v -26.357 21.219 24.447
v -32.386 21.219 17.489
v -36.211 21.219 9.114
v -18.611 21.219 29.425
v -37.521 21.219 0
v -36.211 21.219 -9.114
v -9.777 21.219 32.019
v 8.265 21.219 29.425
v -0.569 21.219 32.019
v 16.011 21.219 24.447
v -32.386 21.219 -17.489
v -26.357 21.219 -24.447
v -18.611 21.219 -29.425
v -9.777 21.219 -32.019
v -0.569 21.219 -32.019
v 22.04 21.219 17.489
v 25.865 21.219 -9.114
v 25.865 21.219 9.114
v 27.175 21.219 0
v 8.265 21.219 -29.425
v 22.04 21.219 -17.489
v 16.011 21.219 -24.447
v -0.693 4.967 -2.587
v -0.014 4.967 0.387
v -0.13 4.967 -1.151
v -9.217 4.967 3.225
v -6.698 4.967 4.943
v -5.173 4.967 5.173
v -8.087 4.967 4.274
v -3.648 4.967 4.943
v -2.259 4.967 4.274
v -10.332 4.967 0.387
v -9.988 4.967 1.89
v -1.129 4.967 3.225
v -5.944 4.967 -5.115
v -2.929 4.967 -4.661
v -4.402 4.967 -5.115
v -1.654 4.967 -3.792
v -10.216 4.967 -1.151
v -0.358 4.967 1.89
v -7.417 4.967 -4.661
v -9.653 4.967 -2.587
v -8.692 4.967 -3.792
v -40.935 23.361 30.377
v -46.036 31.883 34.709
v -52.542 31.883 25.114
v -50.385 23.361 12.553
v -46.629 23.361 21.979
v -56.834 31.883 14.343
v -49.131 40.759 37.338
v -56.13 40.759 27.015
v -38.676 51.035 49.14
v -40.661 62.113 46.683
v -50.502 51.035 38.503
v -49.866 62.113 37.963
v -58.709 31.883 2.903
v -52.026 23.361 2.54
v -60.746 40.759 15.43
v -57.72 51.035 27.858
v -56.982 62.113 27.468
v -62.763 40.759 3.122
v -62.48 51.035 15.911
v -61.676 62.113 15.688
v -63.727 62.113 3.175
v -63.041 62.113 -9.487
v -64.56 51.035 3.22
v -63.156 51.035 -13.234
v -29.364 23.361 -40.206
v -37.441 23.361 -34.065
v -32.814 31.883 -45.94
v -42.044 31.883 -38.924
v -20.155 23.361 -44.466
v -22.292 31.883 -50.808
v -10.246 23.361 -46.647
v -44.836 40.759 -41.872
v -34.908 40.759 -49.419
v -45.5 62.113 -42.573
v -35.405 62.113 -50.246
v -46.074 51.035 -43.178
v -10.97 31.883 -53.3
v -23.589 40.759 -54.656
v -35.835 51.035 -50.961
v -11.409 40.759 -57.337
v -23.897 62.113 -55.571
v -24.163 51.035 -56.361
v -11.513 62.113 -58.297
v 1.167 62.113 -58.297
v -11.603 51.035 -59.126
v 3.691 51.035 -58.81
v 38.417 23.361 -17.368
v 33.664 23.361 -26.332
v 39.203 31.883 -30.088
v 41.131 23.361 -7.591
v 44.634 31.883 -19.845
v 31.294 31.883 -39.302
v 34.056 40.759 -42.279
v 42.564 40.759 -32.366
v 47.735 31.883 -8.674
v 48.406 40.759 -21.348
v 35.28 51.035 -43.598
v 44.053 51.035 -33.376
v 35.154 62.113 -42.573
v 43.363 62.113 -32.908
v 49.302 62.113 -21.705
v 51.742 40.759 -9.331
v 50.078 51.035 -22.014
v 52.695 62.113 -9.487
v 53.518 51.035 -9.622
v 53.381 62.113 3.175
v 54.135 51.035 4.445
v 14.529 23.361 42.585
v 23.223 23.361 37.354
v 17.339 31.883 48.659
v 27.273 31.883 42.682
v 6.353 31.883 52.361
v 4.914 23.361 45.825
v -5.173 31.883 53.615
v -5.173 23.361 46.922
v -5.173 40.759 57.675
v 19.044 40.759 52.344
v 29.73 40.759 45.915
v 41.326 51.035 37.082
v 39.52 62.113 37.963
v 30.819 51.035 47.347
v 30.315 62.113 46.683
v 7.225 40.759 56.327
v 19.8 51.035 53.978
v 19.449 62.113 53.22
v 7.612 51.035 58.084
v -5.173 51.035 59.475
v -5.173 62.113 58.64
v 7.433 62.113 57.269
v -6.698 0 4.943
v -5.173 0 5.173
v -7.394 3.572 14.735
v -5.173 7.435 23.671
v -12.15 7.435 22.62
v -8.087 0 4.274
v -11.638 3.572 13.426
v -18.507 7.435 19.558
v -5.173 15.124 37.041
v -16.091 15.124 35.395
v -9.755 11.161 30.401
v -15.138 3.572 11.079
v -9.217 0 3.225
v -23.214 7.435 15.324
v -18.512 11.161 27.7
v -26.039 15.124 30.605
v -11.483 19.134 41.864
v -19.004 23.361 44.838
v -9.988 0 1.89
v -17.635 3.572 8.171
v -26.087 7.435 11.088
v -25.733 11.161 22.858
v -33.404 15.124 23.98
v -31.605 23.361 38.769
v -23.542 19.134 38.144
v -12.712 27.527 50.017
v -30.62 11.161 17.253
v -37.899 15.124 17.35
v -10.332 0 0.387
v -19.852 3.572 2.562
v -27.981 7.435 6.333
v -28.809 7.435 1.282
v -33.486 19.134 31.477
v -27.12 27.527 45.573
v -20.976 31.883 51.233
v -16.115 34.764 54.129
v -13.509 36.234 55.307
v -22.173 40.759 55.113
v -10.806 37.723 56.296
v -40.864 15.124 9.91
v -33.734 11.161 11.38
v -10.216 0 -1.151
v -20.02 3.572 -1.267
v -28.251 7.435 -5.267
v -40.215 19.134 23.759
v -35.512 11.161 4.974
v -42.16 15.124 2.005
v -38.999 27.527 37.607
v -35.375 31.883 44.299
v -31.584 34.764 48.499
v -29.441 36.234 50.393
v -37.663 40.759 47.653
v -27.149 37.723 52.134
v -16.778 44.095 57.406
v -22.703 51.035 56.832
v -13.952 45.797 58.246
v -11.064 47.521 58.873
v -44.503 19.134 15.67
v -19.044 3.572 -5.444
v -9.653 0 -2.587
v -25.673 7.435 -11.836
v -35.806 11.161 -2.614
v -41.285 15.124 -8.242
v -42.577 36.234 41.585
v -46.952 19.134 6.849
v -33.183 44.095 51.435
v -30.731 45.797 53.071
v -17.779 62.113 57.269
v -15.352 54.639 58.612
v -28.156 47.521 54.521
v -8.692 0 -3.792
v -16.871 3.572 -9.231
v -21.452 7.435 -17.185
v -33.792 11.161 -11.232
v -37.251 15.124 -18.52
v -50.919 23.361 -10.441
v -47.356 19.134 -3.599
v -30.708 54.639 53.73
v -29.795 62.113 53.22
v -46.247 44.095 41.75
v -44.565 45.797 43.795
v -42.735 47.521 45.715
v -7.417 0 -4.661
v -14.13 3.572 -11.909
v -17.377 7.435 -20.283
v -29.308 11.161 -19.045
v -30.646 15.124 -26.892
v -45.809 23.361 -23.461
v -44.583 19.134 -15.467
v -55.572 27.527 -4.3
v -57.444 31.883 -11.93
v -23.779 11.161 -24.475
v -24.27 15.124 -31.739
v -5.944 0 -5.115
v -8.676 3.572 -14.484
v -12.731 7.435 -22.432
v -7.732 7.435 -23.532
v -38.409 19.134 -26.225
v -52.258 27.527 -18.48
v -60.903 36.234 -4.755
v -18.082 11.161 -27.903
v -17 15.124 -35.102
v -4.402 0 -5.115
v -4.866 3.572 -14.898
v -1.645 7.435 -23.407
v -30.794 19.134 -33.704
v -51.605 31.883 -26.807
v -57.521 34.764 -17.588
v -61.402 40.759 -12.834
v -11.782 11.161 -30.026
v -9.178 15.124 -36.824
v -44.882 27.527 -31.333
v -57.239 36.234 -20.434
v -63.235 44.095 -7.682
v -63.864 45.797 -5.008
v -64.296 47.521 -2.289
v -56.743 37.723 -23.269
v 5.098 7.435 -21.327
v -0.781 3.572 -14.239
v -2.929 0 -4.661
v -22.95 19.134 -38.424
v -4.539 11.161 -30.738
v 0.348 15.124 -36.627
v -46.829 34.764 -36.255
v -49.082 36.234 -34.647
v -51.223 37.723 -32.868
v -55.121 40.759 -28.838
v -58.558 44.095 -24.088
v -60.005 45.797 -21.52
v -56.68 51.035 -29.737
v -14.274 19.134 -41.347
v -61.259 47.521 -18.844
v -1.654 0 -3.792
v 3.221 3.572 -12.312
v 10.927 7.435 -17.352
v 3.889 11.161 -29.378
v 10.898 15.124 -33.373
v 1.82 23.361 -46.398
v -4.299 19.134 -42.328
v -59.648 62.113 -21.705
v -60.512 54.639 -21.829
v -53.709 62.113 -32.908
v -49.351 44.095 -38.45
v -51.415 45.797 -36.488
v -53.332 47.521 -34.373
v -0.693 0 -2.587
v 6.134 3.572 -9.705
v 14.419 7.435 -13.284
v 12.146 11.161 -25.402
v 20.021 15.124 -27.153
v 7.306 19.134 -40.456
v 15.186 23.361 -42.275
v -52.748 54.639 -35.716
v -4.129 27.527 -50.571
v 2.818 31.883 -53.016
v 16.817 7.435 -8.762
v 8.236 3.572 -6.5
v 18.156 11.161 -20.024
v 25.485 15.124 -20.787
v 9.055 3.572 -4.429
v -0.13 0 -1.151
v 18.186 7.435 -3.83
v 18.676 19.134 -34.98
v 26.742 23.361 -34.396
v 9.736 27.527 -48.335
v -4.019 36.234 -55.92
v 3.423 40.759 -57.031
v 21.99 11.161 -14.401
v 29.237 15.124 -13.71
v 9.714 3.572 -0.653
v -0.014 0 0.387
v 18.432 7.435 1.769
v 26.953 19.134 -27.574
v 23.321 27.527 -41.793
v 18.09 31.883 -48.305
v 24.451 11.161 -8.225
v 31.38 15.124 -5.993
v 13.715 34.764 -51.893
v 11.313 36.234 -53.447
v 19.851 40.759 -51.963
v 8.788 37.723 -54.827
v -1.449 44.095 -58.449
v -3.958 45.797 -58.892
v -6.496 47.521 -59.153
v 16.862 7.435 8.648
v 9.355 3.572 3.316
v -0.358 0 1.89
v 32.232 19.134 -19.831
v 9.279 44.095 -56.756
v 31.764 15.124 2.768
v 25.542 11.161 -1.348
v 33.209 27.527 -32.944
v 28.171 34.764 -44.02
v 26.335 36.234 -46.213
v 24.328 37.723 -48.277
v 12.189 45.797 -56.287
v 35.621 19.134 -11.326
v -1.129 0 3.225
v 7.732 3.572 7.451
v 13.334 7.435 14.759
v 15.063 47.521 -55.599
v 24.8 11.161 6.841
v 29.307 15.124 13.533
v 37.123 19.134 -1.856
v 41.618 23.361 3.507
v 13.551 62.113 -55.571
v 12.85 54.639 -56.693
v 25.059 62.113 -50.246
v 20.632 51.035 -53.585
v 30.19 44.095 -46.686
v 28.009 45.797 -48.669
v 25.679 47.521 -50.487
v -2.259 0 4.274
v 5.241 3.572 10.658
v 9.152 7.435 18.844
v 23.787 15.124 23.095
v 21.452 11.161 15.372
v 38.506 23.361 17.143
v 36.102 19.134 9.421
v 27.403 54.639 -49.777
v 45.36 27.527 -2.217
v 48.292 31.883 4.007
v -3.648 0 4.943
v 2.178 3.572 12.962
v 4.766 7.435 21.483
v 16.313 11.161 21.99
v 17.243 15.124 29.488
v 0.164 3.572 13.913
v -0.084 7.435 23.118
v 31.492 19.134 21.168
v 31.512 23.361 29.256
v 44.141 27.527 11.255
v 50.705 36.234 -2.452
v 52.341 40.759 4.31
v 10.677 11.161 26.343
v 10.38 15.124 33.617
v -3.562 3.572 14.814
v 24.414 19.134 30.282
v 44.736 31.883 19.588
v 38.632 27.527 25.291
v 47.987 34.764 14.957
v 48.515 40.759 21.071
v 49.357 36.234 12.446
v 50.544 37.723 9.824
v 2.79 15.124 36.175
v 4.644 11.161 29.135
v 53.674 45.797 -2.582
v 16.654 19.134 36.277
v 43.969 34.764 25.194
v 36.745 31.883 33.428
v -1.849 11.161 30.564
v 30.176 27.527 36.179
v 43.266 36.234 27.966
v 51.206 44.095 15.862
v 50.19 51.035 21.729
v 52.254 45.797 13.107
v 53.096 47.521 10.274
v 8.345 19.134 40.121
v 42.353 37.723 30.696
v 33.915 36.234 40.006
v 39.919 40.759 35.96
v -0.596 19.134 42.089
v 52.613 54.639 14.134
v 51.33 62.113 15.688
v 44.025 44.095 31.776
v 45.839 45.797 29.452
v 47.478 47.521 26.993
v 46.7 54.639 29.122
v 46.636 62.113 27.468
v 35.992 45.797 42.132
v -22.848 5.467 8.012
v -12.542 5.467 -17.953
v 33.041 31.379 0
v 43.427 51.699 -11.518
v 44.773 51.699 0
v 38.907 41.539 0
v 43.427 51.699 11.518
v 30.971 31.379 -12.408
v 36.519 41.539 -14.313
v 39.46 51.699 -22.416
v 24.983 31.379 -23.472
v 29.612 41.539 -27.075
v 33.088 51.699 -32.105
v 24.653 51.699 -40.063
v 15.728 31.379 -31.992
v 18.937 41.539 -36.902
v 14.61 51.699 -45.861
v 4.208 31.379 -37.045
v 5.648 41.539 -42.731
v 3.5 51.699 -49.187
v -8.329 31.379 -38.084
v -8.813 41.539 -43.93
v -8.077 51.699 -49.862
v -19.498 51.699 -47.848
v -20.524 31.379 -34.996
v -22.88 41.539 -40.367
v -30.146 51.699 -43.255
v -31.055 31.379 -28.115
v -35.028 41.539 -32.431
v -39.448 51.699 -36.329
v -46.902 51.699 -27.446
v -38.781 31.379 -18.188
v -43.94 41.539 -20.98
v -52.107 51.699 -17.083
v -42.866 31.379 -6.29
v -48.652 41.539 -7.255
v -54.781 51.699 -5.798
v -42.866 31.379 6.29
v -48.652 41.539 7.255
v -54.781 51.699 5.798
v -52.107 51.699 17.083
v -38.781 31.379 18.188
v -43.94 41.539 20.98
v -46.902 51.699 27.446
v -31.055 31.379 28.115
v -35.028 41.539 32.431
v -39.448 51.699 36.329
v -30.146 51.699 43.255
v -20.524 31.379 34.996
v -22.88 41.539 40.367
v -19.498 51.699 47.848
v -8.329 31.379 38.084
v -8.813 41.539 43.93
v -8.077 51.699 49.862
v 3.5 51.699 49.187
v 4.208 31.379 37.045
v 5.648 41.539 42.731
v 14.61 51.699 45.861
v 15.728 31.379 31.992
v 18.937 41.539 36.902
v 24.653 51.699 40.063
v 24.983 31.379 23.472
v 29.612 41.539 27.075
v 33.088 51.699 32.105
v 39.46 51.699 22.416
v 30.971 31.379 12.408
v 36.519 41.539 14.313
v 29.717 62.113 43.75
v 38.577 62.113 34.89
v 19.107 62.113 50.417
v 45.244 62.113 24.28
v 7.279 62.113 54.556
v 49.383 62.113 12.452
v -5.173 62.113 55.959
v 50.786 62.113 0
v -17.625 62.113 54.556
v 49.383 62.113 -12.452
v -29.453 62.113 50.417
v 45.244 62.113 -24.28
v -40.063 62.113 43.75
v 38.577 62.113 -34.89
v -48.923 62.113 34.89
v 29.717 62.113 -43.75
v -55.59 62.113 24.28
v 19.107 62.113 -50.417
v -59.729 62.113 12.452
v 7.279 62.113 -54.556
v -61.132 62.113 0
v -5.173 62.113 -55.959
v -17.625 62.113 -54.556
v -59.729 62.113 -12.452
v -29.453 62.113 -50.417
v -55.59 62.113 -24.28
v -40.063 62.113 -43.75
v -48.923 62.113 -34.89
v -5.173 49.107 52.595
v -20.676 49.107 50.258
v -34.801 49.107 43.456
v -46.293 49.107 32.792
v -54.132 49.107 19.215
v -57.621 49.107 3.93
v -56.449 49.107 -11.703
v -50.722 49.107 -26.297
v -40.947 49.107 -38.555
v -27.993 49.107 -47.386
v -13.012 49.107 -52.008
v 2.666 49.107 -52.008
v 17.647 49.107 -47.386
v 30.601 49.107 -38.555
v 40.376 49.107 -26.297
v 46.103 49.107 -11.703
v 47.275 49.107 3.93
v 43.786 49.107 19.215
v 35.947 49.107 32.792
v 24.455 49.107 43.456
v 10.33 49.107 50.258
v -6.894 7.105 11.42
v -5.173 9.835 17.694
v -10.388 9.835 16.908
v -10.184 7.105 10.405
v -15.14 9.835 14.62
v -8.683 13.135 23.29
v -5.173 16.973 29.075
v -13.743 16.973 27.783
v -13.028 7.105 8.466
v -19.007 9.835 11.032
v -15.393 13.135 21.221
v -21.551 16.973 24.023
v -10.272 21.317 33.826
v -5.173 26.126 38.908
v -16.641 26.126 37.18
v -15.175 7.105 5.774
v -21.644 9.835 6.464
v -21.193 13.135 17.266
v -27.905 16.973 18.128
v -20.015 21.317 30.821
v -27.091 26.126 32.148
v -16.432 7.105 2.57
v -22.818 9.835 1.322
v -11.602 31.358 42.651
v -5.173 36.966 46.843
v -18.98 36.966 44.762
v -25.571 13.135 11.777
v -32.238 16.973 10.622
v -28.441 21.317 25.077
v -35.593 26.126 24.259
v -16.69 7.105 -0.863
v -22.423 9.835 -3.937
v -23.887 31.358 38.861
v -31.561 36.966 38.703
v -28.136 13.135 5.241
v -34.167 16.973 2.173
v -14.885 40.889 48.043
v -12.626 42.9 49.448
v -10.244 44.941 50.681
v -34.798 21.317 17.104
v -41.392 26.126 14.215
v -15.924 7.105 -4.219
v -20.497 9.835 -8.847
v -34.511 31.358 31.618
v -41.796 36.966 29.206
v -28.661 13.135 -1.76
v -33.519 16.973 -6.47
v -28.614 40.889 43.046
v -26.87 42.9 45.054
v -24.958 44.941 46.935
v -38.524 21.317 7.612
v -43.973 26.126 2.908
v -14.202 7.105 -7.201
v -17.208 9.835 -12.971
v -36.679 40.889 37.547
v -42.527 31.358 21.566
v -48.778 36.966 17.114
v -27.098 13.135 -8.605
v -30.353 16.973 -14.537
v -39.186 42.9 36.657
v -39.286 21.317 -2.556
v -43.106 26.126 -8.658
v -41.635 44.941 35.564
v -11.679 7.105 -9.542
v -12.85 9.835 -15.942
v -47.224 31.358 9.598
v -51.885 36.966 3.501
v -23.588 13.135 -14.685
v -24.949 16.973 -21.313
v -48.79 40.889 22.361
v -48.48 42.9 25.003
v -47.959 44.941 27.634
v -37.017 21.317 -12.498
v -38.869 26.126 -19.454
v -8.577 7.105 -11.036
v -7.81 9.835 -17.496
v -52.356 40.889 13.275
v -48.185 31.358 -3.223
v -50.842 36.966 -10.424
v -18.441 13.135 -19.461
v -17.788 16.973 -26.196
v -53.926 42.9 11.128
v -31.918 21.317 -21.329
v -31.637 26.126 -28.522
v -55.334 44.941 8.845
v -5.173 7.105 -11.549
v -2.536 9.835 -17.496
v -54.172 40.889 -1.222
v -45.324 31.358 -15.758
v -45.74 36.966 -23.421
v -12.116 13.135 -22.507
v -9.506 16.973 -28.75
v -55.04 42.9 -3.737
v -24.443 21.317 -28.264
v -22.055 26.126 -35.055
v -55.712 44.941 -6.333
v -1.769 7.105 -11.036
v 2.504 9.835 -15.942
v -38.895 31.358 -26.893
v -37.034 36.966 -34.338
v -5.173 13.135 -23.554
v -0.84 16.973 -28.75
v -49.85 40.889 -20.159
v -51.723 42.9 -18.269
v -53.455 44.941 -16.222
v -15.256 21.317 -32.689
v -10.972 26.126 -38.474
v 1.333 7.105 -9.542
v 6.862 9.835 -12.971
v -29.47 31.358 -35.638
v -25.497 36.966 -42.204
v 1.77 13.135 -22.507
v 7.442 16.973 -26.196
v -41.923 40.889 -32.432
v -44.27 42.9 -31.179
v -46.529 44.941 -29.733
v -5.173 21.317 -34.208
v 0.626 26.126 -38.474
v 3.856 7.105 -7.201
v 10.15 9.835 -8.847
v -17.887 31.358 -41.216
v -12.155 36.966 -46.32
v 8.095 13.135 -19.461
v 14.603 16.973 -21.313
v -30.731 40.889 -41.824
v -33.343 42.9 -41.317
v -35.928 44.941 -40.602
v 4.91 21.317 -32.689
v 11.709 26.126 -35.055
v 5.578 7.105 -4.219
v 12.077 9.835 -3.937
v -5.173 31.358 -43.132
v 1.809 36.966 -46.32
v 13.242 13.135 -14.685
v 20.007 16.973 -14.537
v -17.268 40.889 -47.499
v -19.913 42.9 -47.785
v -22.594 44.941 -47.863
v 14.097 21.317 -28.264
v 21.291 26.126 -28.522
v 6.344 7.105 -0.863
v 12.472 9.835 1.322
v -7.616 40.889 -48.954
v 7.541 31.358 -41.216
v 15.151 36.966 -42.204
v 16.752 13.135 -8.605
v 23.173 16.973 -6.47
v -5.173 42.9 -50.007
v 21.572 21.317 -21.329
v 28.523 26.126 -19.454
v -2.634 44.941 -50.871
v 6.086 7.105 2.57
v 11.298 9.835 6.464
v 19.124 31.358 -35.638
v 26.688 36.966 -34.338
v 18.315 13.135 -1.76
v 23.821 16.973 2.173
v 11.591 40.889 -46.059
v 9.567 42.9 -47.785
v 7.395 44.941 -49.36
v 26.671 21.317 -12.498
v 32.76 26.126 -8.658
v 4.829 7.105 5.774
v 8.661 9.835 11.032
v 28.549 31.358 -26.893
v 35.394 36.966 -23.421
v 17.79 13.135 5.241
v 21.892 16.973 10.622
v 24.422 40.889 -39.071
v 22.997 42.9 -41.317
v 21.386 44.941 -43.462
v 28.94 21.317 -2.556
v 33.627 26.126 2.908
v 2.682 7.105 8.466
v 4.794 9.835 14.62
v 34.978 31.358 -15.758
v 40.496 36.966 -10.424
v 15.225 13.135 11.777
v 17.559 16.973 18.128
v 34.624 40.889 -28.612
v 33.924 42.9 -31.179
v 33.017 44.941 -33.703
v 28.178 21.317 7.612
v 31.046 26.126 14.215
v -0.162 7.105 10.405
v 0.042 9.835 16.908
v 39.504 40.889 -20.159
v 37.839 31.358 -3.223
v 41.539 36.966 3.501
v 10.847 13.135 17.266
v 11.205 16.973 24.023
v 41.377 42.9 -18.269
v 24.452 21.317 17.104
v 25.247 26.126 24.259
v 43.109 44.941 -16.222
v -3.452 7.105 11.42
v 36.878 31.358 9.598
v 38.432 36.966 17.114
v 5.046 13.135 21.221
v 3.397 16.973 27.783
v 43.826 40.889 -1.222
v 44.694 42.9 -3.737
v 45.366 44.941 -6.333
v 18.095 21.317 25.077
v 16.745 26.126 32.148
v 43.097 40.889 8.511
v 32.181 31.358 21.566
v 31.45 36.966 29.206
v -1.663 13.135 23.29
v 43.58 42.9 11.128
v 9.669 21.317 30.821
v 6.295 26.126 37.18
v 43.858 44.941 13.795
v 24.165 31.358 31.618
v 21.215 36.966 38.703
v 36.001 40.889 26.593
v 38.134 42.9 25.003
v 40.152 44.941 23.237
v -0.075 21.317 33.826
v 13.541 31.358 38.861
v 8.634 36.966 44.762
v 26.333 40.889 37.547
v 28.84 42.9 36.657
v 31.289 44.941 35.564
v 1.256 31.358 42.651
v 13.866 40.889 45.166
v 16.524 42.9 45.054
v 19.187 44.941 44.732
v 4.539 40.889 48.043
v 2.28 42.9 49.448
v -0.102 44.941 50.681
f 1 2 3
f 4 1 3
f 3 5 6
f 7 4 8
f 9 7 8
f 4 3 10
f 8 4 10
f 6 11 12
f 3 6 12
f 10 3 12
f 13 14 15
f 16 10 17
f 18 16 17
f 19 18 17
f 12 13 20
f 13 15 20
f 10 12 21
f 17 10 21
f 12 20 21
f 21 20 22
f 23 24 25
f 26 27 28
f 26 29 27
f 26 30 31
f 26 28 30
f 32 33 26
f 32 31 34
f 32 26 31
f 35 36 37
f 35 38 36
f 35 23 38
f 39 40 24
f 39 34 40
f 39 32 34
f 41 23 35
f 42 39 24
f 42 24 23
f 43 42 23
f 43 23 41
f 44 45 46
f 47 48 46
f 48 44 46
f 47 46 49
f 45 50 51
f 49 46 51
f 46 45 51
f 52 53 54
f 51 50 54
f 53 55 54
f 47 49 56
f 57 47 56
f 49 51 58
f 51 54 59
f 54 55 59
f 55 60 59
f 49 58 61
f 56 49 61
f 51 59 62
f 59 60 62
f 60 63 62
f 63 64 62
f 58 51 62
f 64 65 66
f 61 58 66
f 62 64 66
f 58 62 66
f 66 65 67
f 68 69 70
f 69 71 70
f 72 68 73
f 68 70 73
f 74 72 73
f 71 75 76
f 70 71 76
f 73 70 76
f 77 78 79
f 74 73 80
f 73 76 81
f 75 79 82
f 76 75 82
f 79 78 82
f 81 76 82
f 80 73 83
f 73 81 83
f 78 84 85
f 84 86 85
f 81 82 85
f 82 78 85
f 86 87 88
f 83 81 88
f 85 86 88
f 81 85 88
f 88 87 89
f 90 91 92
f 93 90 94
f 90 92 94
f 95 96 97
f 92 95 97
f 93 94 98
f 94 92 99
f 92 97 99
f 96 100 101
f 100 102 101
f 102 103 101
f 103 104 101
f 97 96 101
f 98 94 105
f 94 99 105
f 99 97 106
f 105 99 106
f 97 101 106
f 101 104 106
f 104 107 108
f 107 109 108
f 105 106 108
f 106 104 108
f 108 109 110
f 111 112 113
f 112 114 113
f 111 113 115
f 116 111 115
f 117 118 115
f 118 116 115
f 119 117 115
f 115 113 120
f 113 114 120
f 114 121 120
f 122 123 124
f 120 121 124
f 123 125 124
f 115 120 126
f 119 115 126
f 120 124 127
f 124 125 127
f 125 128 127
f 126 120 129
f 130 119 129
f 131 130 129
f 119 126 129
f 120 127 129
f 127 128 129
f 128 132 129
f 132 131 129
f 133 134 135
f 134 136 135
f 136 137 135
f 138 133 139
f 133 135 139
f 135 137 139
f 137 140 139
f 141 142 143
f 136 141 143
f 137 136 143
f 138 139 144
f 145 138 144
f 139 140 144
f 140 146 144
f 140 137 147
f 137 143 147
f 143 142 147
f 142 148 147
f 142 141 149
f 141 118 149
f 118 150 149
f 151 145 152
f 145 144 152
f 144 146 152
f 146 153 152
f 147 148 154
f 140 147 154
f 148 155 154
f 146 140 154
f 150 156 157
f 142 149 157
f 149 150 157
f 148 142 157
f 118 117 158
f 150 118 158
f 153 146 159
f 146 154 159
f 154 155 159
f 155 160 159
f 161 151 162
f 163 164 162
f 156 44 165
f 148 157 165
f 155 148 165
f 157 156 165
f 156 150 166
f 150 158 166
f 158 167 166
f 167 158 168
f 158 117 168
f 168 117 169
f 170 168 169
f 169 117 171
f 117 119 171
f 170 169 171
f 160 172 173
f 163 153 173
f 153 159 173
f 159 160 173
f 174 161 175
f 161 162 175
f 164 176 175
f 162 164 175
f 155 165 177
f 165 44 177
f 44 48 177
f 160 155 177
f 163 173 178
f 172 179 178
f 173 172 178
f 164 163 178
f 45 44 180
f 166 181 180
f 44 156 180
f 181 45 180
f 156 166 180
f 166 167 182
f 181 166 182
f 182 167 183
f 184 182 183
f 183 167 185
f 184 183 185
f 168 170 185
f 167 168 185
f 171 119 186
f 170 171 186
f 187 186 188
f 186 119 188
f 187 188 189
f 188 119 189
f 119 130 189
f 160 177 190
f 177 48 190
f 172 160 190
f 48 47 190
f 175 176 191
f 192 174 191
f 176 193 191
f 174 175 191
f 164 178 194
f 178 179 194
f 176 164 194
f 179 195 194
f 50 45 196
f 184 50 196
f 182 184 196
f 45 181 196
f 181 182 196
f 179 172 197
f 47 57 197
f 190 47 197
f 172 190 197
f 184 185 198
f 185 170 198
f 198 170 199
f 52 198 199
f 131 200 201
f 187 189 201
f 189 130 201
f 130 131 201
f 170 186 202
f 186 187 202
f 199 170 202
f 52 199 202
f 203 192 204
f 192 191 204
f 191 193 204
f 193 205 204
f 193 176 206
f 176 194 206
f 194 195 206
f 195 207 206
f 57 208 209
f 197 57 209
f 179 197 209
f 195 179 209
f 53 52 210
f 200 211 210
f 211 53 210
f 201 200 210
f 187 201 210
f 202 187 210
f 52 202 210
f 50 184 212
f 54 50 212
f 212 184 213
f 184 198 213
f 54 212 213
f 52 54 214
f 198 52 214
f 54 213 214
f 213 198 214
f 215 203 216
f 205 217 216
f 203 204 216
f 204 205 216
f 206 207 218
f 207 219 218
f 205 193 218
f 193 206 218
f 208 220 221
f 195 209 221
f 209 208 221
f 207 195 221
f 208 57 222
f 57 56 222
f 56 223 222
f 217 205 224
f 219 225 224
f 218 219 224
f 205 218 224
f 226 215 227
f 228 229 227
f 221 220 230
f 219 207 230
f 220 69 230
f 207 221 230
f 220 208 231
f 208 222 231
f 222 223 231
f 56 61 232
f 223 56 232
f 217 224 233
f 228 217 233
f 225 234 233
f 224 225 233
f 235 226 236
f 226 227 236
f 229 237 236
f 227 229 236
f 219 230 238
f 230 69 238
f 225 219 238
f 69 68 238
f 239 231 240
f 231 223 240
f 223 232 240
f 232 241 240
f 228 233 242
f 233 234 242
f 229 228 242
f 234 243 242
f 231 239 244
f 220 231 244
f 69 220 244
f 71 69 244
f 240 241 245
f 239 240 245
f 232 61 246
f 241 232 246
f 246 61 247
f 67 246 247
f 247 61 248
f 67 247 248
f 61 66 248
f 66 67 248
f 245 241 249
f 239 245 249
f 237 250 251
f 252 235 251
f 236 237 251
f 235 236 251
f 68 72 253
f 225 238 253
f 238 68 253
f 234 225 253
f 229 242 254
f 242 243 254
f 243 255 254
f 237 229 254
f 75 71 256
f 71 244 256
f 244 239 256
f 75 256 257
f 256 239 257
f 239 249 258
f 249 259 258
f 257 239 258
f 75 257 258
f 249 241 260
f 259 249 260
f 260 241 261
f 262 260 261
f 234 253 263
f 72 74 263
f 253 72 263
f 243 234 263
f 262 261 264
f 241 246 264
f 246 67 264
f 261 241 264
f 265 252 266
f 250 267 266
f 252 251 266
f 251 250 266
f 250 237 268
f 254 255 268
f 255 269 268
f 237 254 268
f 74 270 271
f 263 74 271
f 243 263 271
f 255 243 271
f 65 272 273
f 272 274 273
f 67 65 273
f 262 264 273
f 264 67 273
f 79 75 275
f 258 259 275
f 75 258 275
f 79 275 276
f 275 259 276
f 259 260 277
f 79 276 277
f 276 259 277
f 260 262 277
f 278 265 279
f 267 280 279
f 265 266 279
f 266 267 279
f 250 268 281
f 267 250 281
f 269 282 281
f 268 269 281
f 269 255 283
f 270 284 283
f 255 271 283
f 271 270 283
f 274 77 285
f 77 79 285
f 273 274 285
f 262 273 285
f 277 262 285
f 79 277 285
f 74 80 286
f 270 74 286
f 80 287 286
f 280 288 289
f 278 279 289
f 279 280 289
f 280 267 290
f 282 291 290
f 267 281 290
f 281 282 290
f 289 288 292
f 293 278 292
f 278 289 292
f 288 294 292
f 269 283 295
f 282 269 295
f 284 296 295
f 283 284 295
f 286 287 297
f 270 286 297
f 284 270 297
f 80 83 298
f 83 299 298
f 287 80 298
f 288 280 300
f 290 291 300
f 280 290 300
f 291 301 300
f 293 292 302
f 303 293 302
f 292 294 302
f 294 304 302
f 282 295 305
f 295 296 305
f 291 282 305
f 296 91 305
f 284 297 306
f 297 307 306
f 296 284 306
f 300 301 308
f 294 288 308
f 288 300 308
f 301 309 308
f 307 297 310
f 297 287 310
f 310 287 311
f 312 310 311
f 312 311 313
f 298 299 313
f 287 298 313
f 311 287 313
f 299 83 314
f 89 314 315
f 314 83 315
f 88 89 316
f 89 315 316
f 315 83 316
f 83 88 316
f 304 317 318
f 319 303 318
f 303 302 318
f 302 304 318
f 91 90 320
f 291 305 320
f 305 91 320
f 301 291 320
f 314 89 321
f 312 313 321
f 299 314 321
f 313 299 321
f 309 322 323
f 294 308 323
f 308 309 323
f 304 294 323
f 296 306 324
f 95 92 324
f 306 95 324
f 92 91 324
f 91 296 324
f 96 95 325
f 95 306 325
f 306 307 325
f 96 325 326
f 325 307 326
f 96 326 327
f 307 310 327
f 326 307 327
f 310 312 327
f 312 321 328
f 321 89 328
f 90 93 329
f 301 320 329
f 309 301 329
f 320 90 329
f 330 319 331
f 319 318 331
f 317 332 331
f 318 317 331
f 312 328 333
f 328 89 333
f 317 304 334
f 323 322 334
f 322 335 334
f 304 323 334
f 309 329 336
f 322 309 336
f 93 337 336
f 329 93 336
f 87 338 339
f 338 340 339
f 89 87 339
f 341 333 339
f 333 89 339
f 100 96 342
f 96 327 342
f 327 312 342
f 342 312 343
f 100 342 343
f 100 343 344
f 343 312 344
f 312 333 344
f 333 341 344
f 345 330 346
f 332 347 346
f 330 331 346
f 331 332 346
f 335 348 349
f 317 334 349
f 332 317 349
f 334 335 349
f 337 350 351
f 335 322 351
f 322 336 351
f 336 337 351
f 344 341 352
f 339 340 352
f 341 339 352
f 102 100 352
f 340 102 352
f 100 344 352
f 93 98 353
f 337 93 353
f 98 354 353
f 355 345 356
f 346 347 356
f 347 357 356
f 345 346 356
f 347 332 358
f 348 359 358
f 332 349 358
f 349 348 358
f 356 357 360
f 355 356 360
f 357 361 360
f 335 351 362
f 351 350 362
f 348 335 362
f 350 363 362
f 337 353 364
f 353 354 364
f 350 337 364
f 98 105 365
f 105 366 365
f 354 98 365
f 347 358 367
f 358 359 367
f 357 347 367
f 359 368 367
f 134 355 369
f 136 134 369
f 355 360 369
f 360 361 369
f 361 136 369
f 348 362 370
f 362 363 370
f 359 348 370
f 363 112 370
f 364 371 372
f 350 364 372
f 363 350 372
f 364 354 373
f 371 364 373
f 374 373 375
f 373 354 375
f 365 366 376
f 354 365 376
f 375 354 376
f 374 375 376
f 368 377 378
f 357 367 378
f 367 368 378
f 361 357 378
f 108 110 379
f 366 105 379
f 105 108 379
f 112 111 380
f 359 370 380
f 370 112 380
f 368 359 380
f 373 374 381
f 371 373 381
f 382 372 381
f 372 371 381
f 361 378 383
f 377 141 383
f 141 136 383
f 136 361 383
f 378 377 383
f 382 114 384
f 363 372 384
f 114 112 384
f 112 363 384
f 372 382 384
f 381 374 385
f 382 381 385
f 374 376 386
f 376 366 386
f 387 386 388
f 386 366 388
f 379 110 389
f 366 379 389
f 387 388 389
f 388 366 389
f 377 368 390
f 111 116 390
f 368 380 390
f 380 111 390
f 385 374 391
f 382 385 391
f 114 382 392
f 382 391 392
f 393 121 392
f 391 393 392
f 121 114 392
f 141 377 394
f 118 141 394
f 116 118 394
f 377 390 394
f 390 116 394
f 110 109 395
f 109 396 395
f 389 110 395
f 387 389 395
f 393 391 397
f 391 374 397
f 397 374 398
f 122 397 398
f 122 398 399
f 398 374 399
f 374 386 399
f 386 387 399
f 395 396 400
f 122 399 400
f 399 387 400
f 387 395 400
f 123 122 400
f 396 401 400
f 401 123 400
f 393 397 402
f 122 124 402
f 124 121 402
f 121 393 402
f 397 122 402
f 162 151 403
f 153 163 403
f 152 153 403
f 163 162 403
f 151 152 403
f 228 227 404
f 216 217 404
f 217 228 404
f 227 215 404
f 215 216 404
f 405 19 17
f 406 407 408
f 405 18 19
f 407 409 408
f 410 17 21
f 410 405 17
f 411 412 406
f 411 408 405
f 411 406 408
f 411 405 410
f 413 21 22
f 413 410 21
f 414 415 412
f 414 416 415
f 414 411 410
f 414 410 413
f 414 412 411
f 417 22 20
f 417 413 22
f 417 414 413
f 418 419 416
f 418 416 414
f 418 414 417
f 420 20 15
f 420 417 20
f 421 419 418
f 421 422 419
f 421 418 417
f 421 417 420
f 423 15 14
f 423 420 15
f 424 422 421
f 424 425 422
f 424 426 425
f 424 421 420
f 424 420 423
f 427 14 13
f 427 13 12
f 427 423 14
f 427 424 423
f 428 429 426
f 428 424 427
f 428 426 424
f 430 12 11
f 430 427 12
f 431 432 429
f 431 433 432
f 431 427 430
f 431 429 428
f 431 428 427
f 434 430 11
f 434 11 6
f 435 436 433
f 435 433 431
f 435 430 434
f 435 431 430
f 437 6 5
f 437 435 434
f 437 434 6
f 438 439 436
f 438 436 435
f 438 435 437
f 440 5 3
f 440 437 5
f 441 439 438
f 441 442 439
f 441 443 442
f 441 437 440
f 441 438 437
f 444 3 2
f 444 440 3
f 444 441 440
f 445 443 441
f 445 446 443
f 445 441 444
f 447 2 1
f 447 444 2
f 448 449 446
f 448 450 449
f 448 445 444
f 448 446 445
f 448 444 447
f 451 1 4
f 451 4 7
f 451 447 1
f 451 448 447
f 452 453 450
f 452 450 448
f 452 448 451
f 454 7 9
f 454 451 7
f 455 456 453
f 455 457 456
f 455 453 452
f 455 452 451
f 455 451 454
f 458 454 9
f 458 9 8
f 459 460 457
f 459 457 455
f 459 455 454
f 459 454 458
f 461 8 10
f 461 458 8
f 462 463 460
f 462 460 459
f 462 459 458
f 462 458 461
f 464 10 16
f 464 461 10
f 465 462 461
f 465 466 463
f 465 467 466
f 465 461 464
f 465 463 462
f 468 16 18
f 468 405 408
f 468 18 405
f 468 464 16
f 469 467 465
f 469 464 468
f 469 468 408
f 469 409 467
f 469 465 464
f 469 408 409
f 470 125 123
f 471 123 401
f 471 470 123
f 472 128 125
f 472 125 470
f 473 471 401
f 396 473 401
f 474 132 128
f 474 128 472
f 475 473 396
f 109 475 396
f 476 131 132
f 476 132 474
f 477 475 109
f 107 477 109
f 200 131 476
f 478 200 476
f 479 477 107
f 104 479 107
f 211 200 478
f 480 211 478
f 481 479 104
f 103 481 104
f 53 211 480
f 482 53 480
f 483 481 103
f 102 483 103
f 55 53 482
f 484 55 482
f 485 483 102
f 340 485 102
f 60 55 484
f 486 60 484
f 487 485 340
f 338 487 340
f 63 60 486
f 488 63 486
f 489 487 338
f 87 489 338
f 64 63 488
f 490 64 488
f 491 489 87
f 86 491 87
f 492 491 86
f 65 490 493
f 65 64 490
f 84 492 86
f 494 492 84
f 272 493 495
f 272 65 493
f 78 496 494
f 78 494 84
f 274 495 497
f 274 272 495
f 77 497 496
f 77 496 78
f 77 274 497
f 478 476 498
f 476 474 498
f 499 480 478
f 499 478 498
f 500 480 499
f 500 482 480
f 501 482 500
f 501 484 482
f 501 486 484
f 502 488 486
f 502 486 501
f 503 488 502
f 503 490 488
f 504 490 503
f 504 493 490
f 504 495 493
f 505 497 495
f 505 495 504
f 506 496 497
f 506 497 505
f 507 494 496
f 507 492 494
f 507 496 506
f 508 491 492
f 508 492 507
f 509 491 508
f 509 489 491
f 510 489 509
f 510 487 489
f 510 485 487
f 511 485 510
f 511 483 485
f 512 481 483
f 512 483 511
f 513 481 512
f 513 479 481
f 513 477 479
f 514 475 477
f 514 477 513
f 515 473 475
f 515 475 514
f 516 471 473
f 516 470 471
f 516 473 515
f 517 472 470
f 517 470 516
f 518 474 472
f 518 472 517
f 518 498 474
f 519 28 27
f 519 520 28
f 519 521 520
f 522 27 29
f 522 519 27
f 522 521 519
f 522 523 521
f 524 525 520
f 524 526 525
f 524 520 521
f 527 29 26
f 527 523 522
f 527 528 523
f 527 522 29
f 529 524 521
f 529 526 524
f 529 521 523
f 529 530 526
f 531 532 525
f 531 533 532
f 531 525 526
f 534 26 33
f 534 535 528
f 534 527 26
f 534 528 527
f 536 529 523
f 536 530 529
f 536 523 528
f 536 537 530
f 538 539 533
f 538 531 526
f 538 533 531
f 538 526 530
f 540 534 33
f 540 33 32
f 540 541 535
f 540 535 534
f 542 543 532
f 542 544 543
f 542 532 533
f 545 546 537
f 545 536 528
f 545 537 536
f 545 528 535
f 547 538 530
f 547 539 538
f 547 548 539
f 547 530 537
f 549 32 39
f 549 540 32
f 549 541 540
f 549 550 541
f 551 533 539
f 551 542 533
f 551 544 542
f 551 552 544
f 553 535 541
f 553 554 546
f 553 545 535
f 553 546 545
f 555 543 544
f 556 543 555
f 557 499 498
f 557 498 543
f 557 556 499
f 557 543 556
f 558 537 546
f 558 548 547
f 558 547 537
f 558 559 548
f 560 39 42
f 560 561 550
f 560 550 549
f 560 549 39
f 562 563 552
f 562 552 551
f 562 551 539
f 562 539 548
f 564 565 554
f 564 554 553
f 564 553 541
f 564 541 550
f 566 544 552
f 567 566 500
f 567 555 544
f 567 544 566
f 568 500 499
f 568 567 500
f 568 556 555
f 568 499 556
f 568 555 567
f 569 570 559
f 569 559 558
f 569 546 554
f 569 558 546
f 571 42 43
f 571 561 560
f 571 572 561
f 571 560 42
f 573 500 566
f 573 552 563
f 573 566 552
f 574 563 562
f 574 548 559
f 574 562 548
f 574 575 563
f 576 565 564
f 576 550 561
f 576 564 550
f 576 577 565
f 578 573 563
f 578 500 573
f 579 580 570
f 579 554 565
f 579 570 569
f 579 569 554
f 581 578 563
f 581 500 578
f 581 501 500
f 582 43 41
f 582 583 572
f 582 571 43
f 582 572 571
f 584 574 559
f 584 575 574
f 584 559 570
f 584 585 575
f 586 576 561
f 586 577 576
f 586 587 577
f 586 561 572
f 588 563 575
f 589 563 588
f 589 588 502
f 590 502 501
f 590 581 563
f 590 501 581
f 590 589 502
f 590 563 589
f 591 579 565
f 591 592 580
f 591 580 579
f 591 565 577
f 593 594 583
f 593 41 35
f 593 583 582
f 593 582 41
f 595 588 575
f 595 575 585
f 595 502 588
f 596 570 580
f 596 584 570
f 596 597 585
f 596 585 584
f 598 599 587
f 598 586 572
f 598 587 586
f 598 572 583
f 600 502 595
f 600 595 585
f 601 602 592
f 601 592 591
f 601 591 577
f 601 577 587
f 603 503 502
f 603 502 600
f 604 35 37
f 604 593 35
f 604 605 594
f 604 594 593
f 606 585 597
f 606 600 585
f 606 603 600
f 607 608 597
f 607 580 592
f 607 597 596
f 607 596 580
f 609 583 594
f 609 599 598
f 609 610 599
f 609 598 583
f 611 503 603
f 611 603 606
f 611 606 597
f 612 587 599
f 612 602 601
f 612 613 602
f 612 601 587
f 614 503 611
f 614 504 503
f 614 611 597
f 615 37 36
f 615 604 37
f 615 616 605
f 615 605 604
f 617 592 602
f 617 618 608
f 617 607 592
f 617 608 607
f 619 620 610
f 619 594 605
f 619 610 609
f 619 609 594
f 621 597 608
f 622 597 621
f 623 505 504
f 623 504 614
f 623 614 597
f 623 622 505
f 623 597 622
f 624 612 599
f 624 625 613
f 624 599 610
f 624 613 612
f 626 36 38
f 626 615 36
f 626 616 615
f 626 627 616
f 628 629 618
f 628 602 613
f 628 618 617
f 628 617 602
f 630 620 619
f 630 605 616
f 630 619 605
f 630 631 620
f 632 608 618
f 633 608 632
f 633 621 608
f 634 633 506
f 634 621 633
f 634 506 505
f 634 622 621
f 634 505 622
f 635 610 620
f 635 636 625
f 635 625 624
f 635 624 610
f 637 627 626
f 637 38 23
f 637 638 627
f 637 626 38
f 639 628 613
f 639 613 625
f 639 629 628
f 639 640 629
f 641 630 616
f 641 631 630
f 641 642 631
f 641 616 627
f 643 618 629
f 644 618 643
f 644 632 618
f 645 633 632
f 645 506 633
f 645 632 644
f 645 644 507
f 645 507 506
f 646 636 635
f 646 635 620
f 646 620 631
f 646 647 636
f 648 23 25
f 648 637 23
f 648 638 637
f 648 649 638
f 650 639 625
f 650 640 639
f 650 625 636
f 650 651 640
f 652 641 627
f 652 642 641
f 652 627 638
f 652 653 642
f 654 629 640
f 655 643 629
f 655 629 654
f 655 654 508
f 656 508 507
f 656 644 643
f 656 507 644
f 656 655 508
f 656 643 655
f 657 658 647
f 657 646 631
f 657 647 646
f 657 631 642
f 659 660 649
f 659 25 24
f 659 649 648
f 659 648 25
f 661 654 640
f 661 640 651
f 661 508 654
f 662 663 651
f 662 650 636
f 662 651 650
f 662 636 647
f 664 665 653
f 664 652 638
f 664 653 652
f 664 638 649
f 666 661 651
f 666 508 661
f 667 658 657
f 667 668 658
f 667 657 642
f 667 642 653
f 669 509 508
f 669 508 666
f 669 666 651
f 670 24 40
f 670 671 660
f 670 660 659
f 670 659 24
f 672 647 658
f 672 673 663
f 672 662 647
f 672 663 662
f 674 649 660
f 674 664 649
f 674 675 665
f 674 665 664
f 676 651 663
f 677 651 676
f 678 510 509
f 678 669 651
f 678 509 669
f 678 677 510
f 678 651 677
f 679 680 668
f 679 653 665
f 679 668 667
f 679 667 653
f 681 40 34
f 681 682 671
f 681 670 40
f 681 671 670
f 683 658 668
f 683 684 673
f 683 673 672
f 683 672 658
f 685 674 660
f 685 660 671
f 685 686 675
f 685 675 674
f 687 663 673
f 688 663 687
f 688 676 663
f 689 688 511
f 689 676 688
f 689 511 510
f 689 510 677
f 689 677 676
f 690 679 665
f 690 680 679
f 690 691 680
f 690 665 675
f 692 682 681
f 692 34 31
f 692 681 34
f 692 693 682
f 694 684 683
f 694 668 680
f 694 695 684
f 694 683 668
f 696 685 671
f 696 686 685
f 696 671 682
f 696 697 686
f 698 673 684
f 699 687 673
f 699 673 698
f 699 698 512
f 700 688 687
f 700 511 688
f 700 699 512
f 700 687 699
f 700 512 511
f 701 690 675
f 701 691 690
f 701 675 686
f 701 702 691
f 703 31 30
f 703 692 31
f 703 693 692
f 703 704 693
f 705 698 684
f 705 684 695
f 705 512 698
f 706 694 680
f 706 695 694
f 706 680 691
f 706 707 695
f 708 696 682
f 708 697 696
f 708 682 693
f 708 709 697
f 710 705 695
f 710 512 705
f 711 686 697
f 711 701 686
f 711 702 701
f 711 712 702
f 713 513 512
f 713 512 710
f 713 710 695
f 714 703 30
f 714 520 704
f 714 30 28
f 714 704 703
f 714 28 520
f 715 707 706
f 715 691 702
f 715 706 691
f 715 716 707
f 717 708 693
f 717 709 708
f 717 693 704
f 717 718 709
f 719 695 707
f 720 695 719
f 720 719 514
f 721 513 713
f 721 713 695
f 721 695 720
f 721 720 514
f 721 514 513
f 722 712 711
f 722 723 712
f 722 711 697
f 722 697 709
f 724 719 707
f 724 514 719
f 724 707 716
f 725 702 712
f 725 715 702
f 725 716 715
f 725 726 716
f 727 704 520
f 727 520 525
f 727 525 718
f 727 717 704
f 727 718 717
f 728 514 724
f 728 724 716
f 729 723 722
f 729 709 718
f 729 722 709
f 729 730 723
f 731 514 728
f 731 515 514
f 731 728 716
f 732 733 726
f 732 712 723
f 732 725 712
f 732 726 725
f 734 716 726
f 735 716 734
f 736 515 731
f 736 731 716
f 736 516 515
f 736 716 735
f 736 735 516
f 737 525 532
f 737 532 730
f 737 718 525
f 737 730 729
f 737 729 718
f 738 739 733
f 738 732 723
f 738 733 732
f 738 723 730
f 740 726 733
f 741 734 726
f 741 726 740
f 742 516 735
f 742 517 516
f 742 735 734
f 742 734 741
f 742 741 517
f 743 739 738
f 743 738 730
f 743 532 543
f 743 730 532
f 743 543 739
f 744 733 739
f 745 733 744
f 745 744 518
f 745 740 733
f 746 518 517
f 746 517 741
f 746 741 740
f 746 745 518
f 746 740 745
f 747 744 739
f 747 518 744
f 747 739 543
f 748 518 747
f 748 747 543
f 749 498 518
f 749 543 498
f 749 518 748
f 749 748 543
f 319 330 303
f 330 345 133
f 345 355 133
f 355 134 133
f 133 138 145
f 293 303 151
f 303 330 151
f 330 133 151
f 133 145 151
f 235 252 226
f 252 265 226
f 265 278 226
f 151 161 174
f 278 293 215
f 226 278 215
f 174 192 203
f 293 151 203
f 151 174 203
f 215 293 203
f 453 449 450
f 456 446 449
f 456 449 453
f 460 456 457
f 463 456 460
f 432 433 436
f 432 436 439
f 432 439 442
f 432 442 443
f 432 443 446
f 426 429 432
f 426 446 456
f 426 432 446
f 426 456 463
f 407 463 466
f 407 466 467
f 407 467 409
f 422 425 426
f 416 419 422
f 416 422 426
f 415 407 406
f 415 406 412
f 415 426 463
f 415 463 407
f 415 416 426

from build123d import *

# Parameters (mm, degrees)
SKETCH2_W           = 5.1730077
SKETCH2_H           = 4.967486285
SKETCH3_R           = 55.958577803
BOSS_EXTRUDE6_DEPTH = 40.894
BOSS_EXTRUDE6_DRAFT = -30
SKETCH4_R           = 55.958577803
CUT_EXTRUDE1_DEPTH  = 10.414
CUT_EXTRUDE1_DRAFT  = -30


with BuildPart() as part:
    # Sketch2 → Revolve6 (revolve)
    with BuildSketch(Plane.XY, mode=Mode.PRIVATE) as revolve6_sk:
        with BuildLine():
            Line((0, 0), (0, 4.967486285))
            ThreePointArc((0, 4.967486285), (33.735351897, 26.125891978), (50.785570102, 62.112586162))
            Line((50.785570102, 62.112586162), (53.467247511, 62.112586162))
            add(Edge.make_bspline(
                [(0, 0), (61.255663305, 20.559397644), (53.467247511, 62.112586162)],
                knots=[0, 0, 0, 1, 1, 1], degree=2))
        make_face()
        with Locations((-2.58650385, 2.483743143)):
            Rectangle(SKETCH2_W, SKETCH2_H)
    revolve(revolve6_sk.sketch.rotate(Axis((-5.1730077, 4.967486285, 0), (0, -1, 0)), 90), axis=Axis((-5.1730077, 4.967486285, 0), (0, -1, 0)))


with BuildPart() as body_2:
    # Sketch3 → Boss-Extrude6 (with draft: the straight prism first)
    with BuildSketch(Plane(origin=(0, 62.112586162, 0), x_dir=(1, 0, 0), z_dir=(0, 1, 0))):
        with Locations((-5.1730077, 0)):
            Circle(SKETCH3_R)
    extrude(amount=-BOSS_EXTRUDE6_DEPTH)
    # Boss-Extrude6: the draft: its side faces are tilted about the plane it starts from
    boss_extrude6_sides = [body_2.faces().sort_by_distance(p)[0] for p in [
        (-61.131585503, 41.665586162, 0),
    ]]
    draft(boss_extrude6_sides, Plane(origin=(0, 62.112586162, 0), x_dir=(1, 0, 0), z_dir=(0, 1, 0)), BOSS_EXTRUDE6_DRAFT)


with BuildPart() as cut_extrude1_tool:
    # Sketch4 → Cut-Extrude1 (with draft: the straight prism first)
    with BuildSketch(Plane(origin=(0, 62.112586162, 0), x_dir=(1, 0, 0), z_dir=(0, 1, 0))):
        with Locations((-5.1730077, 0)):
            Circle(SKETCH4_R)
    extrude(amount=-CUT_EXTRUDE1_DEPTH)
    # Cut-Extrude1: the draft: its side faces are tilted about the plane it starts from
    cut_extrude1_sides = [cut_extrude1_tool.faces().sort_by_distance(p)[0] for p in [
        (-61.131585503, 56.905586162, 0),
    ]]
    draft(cut_extrude1_sides, Plane(origin=(0, 62.112586162, 0), x_dir=(1, 0, 0), z_dir=(0, 1, 0)), CUT_EXTRUDE1_DRAFT)


with BuildPart() as body_2_1:
    add(body_2.part)

    # Cut-Extrude1: cut by cut_extrude1_tool
    add(cut_extrude1_tool.part, mode=Mode.SUBTRACT)


solid = Compound([part.part, body_2_1.part])
